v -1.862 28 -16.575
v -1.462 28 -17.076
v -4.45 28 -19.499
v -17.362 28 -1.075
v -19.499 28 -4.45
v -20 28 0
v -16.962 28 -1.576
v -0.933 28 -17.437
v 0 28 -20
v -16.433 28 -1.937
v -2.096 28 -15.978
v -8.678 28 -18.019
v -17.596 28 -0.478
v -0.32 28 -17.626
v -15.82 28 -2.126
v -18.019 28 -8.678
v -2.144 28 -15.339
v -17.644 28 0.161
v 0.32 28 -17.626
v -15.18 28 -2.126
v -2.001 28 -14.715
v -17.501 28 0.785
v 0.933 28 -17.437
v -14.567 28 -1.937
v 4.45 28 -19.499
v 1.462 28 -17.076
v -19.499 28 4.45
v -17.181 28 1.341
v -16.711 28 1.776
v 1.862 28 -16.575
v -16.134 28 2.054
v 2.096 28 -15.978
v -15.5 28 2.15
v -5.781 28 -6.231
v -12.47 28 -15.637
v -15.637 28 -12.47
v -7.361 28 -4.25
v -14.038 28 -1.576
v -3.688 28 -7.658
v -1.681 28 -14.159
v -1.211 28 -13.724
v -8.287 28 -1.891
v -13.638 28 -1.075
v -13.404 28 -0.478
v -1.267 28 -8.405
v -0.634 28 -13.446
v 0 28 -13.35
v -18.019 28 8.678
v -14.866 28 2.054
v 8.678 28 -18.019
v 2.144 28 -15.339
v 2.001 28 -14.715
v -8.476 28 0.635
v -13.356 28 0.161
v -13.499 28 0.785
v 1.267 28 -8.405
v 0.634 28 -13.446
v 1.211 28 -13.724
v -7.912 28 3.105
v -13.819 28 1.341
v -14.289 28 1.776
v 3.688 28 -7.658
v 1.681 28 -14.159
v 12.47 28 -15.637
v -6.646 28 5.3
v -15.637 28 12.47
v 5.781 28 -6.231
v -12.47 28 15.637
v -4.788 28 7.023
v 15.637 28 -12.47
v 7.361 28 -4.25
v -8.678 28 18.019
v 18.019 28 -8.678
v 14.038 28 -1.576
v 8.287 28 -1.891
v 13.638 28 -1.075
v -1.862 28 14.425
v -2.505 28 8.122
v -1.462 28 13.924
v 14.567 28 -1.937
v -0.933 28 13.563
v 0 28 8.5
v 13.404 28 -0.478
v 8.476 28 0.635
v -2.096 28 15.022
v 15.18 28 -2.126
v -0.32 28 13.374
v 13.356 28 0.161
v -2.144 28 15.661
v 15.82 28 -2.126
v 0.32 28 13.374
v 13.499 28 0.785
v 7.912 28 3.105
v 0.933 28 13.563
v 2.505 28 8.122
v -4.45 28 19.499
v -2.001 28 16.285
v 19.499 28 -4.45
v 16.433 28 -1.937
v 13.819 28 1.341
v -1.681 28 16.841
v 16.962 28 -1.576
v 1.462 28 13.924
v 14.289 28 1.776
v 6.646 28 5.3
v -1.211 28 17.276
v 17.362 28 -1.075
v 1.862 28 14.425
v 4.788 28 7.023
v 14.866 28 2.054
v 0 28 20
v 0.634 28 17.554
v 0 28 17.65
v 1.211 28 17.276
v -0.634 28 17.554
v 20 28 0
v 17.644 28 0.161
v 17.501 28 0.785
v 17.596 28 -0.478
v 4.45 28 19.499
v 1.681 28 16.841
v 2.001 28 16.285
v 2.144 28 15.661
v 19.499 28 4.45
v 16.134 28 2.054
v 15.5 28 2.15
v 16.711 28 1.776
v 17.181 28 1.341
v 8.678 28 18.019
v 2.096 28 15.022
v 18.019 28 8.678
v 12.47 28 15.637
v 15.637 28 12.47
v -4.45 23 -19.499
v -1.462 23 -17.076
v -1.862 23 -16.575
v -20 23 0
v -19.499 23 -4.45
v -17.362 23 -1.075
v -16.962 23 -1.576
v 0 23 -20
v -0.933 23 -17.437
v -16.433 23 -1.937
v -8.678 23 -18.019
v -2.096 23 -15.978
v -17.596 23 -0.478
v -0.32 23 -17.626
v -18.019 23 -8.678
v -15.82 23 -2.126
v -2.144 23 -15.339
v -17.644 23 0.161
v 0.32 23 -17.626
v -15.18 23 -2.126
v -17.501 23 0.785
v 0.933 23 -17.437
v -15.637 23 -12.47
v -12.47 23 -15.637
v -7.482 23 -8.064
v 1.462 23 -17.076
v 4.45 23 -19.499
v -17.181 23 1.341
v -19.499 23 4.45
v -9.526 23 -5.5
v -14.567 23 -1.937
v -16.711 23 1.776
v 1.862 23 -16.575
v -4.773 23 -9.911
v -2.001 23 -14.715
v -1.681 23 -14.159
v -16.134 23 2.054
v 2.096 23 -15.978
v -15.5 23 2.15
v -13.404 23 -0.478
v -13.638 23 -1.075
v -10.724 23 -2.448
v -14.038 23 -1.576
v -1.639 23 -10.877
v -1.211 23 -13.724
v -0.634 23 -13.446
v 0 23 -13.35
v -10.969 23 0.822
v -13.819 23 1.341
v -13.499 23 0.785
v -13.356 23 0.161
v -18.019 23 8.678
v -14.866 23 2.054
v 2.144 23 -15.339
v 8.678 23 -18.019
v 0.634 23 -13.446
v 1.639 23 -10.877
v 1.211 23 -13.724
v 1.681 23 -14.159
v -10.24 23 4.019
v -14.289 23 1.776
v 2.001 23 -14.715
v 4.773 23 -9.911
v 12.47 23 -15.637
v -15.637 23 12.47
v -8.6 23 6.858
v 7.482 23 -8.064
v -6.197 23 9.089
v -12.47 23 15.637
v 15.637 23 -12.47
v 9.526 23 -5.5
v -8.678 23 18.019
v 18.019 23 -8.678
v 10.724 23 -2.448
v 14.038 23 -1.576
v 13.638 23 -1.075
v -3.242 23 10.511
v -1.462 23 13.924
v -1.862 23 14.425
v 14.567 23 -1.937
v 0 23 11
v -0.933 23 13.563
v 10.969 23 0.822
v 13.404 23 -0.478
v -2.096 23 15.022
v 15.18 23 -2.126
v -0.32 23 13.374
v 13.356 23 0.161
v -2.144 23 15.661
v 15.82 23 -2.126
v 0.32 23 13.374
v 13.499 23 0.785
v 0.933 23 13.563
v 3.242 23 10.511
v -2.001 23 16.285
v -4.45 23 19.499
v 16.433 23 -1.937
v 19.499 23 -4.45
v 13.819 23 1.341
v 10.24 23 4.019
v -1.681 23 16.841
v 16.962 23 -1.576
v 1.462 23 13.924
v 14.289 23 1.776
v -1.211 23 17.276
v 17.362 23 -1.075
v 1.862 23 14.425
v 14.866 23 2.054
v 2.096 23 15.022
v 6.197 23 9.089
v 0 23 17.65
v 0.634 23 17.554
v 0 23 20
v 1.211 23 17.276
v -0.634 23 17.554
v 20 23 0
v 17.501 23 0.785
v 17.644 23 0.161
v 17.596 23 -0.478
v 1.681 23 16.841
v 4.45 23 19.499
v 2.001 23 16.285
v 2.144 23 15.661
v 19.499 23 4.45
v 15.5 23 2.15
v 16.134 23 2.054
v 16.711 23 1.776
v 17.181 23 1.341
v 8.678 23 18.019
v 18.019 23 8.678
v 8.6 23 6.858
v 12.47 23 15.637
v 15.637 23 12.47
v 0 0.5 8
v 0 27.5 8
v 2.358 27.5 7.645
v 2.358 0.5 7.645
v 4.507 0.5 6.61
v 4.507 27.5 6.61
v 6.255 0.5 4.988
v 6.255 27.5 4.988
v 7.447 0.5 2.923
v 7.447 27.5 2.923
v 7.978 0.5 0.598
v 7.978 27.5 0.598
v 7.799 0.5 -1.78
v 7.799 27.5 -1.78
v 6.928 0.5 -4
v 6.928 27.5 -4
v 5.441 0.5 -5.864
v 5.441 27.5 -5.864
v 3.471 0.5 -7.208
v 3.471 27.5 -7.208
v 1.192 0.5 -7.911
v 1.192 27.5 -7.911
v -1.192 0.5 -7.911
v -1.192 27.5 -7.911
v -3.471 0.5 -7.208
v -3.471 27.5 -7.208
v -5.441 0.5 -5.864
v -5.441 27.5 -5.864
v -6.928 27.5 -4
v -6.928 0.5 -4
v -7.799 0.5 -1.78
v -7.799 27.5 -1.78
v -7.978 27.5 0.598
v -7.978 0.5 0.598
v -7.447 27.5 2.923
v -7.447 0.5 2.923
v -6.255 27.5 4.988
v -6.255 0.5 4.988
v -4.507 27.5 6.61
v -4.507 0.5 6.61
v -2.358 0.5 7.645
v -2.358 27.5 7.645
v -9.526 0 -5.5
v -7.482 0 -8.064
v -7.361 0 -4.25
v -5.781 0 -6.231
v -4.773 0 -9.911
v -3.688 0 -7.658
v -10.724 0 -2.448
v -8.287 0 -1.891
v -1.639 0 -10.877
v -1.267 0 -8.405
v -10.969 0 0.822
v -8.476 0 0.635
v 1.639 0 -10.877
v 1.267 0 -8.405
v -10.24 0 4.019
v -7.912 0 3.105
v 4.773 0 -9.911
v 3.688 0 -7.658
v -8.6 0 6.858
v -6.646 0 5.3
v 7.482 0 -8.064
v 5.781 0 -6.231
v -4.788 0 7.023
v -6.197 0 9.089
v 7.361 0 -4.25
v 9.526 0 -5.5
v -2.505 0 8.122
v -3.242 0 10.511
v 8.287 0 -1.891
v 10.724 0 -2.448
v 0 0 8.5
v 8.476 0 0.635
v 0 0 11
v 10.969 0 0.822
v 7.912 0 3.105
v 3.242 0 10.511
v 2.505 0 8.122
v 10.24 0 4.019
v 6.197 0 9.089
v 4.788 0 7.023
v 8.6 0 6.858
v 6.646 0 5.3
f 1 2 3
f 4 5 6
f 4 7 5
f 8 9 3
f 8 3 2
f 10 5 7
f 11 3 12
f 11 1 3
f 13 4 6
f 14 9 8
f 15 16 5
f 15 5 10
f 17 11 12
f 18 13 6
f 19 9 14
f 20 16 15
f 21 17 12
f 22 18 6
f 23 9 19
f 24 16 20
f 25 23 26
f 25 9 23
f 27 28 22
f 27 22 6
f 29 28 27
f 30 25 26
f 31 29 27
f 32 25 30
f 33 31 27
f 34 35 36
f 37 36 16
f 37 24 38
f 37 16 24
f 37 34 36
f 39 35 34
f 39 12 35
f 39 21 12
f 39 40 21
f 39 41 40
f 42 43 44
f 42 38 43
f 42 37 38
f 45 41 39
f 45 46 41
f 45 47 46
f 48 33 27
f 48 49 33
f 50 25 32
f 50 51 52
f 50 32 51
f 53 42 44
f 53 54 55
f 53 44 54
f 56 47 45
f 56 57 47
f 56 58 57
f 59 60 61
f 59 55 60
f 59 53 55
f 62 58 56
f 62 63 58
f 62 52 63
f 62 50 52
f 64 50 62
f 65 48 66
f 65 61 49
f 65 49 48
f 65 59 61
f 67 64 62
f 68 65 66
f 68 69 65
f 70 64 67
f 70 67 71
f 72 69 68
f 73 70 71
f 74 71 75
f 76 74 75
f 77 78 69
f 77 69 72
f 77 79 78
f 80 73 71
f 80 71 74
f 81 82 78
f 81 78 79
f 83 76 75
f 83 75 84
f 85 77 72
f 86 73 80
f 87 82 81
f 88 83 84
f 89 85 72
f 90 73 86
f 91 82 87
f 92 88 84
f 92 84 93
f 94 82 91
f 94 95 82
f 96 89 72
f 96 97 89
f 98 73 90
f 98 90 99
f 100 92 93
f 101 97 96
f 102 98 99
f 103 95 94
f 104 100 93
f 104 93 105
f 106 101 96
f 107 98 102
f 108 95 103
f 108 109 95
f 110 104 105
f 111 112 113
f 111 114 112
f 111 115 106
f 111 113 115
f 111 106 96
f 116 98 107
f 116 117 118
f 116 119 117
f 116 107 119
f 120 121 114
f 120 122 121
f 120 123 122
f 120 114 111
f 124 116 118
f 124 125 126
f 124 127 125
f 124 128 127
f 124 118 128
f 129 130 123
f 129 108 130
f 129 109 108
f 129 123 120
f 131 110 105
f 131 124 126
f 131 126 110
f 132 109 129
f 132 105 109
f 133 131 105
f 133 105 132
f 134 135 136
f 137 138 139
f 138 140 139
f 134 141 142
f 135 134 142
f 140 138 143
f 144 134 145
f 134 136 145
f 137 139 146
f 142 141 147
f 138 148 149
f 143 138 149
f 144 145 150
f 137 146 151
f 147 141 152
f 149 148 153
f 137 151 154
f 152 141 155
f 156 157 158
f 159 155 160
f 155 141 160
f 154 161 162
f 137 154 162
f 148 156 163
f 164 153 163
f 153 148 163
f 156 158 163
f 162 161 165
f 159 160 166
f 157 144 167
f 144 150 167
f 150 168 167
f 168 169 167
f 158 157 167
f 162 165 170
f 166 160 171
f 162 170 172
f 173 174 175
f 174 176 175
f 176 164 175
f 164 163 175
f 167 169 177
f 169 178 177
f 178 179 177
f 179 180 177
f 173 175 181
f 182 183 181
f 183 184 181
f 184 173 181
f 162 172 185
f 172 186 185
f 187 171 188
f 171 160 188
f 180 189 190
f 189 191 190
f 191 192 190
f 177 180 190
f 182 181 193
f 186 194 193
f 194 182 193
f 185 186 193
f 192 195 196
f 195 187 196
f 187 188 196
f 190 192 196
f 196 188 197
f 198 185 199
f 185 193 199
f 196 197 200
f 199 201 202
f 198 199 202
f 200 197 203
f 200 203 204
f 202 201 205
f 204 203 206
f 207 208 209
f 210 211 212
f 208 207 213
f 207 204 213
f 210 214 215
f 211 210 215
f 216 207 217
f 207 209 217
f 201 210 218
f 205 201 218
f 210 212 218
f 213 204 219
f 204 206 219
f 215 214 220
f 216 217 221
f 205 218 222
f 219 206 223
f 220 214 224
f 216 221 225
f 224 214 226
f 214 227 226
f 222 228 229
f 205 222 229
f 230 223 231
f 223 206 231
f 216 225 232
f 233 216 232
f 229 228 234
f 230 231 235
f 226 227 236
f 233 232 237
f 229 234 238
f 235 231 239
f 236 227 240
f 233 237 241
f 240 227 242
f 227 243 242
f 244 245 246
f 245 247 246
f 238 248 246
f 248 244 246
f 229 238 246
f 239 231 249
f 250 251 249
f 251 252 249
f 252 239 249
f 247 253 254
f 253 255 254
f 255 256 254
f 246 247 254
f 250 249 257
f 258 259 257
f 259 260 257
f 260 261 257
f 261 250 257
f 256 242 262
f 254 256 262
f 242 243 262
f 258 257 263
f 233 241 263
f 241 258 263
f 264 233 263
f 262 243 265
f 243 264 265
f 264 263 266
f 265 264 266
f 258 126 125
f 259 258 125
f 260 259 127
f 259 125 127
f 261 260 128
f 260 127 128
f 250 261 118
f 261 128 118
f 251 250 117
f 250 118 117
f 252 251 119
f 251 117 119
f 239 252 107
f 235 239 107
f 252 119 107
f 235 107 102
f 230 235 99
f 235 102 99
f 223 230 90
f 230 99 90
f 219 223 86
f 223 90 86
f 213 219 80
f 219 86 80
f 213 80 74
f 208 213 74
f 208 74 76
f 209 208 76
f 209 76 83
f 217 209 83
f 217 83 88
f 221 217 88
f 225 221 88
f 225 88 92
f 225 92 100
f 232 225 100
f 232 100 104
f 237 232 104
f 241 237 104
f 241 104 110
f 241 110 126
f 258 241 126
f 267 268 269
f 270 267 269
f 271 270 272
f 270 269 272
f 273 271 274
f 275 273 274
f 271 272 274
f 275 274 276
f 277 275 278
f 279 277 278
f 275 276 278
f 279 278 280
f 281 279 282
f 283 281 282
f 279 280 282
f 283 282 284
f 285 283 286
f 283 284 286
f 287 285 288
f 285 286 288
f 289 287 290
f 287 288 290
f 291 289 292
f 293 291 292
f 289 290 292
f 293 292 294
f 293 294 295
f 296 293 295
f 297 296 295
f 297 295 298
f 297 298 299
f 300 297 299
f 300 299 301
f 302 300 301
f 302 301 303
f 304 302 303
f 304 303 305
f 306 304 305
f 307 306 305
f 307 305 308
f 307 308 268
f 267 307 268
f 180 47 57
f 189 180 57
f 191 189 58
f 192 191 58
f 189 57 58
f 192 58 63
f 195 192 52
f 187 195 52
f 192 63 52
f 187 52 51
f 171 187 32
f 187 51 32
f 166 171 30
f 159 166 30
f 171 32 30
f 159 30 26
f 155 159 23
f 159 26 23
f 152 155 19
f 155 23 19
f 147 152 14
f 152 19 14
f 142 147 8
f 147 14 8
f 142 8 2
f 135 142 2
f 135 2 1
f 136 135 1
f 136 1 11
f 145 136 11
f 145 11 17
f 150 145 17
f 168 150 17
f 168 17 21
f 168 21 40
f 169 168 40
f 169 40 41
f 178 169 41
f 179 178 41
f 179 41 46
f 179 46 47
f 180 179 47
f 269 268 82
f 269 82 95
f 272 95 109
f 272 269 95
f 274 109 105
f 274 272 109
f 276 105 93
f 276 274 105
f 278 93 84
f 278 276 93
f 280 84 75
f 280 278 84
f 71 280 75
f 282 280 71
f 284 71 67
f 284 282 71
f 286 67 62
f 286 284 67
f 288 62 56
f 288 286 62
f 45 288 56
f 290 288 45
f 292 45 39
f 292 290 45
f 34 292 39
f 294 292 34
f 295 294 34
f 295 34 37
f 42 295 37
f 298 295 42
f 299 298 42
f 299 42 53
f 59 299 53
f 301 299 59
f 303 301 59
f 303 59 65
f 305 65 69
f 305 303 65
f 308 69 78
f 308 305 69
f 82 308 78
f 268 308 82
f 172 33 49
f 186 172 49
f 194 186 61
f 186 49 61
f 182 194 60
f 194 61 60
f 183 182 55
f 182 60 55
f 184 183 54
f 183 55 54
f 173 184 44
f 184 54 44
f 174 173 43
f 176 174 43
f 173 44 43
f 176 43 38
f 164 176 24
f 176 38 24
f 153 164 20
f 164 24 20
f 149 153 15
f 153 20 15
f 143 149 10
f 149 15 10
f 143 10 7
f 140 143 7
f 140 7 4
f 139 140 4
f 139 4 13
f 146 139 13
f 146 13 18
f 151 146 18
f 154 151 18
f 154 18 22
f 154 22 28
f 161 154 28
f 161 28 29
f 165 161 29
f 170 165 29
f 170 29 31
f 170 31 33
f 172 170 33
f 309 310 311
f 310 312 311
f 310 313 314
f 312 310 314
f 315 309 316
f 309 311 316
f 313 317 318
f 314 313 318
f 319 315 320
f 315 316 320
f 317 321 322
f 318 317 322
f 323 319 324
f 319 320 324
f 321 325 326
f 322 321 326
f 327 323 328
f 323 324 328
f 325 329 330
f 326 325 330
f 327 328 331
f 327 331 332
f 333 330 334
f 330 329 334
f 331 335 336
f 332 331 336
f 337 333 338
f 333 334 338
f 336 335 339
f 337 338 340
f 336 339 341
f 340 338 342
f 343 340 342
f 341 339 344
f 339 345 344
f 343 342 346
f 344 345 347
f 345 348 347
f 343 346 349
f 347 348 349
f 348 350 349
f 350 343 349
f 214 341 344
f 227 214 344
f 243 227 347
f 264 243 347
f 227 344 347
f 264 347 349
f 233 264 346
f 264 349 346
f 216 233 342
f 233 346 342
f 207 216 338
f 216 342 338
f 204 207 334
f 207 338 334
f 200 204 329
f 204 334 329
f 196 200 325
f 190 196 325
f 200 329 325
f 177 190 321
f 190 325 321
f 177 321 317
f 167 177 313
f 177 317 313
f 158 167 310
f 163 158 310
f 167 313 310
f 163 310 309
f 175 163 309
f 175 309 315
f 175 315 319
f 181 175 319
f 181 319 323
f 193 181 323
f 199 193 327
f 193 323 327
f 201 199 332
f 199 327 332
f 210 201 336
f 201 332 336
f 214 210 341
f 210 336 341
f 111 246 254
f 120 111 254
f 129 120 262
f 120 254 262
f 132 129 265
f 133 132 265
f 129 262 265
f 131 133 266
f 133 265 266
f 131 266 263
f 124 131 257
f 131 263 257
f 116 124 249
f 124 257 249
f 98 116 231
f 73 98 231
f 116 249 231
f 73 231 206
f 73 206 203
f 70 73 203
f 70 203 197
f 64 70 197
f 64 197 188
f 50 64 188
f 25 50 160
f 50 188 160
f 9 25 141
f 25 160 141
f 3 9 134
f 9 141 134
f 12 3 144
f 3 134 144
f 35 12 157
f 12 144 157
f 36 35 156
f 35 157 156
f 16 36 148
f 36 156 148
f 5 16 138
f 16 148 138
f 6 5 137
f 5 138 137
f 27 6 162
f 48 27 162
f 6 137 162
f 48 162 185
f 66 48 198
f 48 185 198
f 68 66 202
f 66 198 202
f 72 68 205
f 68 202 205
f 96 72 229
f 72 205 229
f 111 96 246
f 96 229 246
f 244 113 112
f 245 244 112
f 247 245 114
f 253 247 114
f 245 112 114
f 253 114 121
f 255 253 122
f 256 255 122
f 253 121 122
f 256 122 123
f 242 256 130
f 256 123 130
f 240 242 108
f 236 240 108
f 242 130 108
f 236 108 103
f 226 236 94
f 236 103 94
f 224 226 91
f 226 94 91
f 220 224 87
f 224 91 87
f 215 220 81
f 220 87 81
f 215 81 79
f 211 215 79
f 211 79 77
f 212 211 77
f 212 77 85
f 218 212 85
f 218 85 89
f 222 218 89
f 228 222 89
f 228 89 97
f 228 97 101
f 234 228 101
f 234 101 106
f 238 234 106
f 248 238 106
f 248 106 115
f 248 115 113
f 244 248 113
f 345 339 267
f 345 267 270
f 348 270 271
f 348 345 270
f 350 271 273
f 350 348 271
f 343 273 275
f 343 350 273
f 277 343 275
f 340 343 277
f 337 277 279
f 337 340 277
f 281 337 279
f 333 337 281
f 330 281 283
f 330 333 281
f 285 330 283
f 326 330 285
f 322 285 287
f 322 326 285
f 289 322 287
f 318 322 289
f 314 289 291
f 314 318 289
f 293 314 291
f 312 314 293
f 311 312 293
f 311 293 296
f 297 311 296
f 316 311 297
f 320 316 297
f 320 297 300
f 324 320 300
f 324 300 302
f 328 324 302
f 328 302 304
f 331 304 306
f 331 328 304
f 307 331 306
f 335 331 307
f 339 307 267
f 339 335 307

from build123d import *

# Parameters (mm, degrees)
SKETCH_1_R          = 11
EXTRUDE_1_DEPTH     = 23
SKETCH_2_R          = 20
EXTRUDE_2_DEPTH     = 5
SKETCH_3_R          = 8
CUT_EXTRUDE_1_DEPTH = 40.799497484
CHAMFER_1_SIZE      = 0.5
SKETCH_4_R          = 2.15
CUT_EXTRUDE_2_DEPTH = 40.799497484


with BuildPart() as part:
    # 草图1 → 凸台-拉伸1 (new body)
    with BuildSketch(Plane(origin=(0, 0, 0), x_dir=(1, 0, 0), z_dir=(0, 1, 0))):
        with Locations(Location((0, 0, 0), (0, 0, 270))):
            Circle(SKETCH_1_R)
    extrude(amount=EXTRUDE_1_DEPTH)

    # 草图2 → 凸台-拉伸2 (add)
    with BuildSketch(Plane(origin=(0, 23, 0), x_dir=(1, 0, 0), z_dir=(0, 1, 0))):
        with Locations(Location((0, 0, 0), (0, 0, 270))):
            Circle(SKETCH_2_R)
    extrude(amount=EXTRUDE_2_DEPTH)

    # 草图3 → 切除-拉伸1 (cut, through all)
    with BuildSketch(Plane(origin=(0, 28, 0), x_dir=(1, 0, 0), z_dir=(0, 1, 0))):
        with Locations(Location((0, 0, 0), (0, 0, 270))):
            Circle(SKETCH_3_R)
    extrude(amount=-CUT_EXTRUDE_1_DEPTH, mode=Mode.SUBTRACT)

    # 倒角1
    chamfer_1_edges = [part.edges().sort_by_distance(p)[0] for p in [
        (0, 0, -8),
        (0, 28, -8),
    ]]
    chamfer(chamfer_1_edges, length=CHAMFER_1_SIZE)

    # 草图4 → 切除-拉伸2 (cut, through all)
    with BuildSketch(Plane(origin=(0, 28, 0), x_dir=(1, 0, 0), z_dir=(0, 1, 0))):
        with Locations(Location((0, 15.5, 0), (0, 0, 270))):
            Circle(SKETCH_4_R)
        with Locations(Location((15.5, 0, 0), (0, 0, 270))):
            Circle(SKETCH_4_R)
        with Locations(Location((0, -15.5, 0), (0, 0, 270))):
            Circle(SKETCH_4_R)
        with Locations(Location((-15.5, 0, 0), (0, 0, 270))):
            Circle(SKETCH_4_R)
    extrude(amount=-CUT_EXTRUDE_2_DEPTH, mode=Mode.SUBTRACT)


solid = part.part
